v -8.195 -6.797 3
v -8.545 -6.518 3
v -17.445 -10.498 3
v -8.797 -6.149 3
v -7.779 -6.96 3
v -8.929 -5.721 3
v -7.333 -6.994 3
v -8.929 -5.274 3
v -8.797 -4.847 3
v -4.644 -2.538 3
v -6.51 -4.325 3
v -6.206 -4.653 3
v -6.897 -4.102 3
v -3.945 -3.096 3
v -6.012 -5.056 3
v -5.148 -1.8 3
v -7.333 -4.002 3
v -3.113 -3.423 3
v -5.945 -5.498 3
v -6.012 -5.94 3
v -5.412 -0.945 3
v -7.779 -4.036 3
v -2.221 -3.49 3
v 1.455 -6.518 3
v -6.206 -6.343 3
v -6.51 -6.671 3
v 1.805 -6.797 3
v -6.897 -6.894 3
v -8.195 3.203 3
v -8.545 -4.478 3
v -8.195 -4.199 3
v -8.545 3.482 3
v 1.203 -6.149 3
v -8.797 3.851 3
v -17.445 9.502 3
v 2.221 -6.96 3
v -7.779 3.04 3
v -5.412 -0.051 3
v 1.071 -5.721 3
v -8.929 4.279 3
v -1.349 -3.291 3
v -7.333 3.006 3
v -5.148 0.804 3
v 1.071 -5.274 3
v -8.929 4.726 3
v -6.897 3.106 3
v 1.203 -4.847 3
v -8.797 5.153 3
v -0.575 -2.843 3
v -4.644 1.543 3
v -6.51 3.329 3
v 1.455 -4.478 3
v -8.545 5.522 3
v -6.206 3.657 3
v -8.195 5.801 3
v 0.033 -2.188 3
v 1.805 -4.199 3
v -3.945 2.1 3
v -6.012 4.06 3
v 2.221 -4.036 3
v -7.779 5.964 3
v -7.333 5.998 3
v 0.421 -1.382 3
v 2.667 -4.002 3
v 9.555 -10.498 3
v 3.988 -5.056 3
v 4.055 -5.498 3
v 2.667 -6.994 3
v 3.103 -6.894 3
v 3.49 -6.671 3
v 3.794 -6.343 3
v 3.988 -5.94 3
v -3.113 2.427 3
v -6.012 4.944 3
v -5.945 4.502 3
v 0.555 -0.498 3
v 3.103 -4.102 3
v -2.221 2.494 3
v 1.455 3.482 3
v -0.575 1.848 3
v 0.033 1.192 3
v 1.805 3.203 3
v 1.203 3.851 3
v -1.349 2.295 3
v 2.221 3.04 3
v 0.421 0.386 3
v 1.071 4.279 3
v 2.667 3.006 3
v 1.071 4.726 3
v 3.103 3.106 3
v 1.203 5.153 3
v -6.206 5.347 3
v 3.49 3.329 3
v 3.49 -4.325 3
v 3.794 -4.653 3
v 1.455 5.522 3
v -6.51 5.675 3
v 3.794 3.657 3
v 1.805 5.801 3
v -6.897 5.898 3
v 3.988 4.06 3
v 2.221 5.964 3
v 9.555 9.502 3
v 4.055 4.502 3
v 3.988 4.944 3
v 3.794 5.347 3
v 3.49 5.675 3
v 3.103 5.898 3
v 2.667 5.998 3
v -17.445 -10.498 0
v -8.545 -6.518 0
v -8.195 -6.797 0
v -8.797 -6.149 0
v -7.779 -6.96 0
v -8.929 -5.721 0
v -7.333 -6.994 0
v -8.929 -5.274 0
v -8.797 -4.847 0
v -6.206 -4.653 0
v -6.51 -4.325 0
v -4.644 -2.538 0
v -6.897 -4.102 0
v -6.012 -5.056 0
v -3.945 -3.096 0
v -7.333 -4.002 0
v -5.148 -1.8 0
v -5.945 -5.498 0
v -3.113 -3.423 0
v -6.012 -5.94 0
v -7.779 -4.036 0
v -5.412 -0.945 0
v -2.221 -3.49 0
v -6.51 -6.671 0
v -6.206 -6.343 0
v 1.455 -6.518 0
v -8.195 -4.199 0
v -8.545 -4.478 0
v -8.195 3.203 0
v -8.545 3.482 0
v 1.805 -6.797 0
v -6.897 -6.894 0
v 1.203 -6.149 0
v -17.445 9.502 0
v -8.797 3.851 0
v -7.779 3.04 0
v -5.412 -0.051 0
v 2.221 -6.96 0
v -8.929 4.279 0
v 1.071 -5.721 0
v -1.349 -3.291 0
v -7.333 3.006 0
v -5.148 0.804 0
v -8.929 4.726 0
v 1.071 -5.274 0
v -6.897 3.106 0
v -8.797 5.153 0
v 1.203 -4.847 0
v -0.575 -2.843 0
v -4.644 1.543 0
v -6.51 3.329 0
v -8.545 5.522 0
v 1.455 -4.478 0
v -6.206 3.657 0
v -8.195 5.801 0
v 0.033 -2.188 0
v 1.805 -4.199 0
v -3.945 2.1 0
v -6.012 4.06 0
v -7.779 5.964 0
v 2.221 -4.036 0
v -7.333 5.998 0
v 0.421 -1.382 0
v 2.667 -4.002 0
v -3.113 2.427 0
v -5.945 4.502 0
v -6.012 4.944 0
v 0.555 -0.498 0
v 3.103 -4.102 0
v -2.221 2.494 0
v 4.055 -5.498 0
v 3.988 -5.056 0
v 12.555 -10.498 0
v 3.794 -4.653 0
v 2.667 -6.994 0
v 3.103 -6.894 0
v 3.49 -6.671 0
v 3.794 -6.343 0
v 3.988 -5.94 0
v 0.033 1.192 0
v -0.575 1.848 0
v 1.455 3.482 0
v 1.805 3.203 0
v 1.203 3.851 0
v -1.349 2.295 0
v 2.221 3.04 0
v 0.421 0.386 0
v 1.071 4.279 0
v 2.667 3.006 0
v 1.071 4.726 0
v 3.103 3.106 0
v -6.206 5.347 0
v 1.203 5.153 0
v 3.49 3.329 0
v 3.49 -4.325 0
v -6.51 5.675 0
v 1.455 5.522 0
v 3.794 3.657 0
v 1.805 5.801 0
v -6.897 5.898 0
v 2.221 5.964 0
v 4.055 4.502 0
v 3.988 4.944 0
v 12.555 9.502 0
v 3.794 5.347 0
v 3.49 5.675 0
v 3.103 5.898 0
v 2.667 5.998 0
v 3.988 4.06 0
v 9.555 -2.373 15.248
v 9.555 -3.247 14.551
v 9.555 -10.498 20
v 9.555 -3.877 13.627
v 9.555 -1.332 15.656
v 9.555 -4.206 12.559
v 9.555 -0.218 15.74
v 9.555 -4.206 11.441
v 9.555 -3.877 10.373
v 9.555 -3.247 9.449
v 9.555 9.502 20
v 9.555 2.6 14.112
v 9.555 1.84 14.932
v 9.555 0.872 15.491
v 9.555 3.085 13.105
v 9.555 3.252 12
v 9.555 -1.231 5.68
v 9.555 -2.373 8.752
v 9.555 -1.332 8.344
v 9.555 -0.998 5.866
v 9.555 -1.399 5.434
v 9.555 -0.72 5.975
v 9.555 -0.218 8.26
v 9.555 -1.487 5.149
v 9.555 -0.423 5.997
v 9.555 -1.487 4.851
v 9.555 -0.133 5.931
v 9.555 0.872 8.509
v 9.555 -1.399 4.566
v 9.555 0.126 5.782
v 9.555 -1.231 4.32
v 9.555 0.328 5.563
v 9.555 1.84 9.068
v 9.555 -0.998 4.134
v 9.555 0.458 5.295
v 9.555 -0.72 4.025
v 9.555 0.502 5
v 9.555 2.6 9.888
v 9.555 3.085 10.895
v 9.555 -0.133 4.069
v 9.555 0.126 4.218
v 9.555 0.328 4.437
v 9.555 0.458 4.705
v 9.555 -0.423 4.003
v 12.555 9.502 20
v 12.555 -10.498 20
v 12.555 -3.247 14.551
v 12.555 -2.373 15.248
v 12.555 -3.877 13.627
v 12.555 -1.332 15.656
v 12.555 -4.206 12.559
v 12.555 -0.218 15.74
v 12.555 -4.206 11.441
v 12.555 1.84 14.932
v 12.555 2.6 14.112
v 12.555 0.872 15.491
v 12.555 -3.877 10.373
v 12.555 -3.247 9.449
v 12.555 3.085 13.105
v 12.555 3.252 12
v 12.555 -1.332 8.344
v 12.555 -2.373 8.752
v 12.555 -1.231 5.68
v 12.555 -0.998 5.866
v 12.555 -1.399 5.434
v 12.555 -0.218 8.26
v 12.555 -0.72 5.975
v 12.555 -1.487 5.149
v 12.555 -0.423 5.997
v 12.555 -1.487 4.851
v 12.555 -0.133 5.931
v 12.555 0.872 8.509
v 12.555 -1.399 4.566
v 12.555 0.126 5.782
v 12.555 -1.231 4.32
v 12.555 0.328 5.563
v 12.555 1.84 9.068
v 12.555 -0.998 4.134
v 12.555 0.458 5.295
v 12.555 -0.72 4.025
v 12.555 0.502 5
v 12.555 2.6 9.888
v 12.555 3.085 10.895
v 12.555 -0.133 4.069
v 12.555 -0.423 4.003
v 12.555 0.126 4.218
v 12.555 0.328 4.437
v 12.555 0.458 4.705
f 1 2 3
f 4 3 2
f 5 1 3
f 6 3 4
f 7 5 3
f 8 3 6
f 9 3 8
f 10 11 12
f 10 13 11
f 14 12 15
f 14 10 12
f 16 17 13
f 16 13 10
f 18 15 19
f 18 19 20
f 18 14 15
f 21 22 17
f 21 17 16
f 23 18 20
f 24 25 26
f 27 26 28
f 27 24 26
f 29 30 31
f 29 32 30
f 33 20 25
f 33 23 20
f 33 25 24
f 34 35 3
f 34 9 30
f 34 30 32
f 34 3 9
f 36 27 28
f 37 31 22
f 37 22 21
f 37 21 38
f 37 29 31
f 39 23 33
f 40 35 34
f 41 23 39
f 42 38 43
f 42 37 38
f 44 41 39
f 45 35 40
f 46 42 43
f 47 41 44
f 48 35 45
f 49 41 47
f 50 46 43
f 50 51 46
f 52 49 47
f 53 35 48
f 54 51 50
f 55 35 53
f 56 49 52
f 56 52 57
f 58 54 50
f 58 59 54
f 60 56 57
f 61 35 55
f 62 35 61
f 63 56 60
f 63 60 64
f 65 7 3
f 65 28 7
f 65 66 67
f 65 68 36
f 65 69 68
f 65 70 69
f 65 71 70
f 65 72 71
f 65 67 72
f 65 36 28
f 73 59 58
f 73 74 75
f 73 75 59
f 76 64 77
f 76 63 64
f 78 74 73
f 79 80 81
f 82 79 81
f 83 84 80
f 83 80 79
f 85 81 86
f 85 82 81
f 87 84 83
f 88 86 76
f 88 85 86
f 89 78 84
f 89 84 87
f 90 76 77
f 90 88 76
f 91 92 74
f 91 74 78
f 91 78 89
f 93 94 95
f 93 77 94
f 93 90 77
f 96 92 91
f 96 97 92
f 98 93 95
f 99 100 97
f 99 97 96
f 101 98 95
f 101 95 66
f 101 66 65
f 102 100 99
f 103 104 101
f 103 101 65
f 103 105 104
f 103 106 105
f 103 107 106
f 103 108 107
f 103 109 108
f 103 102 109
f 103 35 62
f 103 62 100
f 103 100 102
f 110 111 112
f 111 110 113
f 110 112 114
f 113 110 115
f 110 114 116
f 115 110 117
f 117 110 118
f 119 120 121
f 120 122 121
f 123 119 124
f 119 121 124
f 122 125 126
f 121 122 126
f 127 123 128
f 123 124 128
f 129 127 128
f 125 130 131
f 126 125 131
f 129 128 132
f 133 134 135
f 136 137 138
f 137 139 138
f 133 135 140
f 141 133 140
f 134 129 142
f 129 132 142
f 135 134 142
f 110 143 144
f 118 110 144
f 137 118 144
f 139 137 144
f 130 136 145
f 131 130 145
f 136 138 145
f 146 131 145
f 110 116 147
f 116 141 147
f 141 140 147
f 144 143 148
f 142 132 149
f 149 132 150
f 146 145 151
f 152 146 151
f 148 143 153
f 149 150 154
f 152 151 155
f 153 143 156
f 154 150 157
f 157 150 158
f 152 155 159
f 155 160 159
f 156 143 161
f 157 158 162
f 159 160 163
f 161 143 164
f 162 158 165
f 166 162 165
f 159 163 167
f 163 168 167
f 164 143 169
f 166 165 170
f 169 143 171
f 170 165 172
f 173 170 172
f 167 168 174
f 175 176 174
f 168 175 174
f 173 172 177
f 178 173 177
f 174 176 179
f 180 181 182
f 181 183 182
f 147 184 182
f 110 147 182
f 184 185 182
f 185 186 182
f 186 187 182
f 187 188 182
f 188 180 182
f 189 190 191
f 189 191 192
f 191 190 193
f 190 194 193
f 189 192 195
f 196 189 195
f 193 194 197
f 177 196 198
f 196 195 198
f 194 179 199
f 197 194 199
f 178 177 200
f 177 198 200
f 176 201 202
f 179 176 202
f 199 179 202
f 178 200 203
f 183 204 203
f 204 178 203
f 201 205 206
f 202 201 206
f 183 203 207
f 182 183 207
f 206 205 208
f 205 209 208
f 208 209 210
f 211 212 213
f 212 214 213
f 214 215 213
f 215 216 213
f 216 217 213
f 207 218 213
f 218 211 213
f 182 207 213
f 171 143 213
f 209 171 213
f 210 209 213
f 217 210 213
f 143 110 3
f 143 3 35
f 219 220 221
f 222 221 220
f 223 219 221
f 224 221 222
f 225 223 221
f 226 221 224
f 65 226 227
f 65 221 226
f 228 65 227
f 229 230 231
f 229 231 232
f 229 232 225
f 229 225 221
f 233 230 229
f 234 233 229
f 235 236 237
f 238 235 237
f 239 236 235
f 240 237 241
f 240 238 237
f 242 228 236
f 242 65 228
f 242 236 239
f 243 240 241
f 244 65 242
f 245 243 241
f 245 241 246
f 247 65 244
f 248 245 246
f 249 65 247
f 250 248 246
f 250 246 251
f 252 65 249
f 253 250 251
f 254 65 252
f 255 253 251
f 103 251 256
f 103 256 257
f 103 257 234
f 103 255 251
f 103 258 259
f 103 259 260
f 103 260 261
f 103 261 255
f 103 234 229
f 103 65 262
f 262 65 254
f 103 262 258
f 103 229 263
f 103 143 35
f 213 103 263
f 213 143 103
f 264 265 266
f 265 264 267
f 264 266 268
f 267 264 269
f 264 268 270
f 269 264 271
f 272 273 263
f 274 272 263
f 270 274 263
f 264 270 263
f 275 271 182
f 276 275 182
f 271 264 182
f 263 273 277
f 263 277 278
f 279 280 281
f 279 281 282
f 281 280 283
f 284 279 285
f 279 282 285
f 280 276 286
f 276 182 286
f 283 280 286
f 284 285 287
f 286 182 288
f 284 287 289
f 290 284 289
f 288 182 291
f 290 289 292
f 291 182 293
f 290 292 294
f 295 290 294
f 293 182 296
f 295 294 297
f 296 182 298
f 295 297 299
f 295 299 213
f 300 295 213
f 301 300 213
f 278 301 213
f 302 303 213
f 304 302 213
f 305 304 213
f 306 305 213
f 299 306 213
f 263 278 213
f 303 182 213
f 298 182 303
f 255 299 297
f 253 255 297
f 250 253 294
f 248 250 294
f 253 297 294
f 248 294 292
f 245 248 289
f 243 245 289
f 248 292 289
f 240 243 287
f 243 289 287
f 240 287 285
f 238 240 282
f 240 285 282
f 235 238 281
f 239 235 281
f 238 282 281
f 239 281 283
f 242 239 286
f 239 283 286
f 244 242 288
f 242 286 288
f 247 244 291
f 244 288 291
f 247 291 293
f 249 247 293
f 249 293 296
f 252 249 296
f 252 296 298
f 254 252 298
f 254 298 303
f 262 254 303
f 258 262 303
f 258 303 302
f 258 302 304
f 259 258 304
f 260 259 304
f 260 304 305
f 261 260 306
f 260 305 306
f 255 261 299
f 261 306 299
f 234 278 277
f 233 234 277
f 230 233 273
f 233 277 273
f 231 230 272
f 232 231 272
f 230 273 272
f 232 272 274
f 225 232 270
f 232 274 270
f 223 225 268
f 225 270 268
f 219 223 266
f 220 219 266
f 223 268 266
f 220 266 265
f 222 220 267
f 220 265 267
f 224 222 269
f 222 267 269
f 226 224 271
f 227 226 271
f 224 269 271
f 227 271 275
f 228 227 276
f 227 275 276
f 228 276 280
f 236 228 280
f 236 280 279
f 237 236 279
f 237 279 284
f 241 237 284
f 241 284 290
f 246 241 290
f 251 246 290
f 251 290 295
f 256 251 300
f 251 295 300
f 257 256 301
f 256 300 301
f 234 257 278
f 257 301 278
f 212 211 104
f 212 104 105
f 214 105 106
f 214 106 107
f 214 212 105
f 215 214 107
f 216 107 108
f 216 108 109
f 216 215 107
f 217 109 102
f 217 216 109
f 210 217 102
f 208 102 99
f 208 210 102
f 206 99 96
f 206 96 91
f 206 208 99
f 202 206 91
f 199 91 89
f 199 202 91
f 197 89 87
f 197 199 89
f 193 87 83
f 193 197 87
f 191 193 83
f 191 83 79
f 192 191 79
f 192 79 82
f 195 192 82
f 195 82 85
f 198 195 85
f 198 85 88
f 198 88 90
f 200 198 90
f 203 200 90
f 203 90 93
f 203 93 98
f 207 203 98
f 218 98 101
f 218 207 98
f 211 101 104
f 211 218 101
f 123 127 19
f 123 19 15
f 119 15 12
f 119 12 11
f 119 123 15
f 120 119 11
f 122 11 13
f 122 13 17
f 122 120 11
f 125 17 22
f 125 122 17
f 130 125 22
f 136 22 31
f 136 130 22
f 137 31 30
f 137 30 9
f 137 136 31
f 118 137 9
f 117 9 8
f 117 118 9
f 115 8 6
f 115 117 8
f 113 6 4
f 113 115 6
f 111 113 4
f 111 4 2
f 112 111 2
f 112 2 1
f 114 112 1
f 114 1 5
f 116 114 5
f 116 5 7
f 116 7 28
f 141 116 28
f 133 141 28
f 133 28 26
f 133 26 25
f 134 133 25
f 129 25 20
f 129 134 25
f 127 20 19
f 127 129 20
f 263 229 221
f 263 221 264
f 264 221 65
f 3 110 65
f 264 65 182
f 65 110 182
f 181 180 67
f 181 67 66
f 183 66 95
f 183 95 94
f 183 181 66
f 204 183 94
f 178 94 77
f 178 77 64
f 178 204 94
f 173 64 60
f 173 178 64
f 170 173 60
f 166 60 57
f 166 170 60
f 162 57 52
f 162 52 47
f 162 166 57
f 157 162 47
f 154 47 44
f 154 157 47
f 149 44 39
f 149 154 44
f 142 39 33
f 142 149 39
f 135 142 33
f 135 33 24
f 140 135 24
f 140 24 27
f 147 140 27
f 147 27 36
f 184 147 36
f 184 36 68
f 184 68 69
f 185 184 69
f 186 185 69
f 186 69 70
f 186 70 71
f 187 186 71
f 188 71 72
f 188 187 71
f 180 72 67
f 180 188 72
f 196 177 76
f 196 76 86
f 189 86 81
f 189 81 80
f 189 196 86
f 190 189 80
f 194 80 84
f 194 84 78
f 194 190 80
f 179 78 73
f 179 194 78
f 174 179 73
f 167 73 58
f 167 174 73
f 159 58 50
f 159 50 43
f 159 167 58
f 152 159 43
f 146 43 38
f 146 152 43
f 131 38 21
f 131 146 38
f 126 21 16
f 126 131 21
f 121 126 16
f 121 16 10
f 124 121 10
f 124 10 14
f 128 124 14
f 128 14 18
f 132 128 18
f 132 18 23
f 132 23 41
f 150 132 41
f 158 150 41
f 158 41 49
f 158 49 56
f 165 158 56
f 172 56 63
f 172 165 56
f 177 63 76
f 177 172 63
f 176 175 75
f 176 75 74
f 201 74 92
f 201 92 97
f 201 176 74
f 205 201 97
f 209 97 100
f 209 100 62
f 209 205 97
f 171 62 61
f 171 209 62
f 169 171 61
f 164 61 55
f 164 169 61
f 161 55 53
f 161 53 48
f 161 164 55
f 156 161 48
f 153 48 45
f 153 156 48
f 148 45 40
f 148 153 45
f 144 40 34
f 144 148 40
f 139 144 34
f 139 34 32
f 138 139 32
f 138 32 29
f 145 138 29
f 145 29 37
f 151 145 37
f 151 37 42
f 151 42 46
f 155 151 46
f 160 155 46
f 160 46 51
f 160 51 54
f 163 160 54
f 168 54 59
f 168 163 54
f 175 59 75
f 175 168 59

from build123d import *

# Parameters (mm, degrees)
F0_W     = 27
F0_H     = 20
F0_R     = 1.5
F0_R_2   = 3
F1_DEPTH = 3
F0_W_2   = 3
F2_DEPTH = 20
F3_R     = 3.75
F3_R_2   = 1
F4_DEPTH = 3


with BuildPart() as f1:
    # F0 (on Top) → F1 (new body)
    with BuildSketch(Plane.XY):
        with Locations((-3.945278, -0.49793)):
            Rectangle(F0_W, F0_H)
        with Locations((-7.445278, -5.49793)):
            Circle(F0_R, mode=Mode.SUBTRACT)
        with Locations((2.554722, -5.49793)):
            Circle(F0_R, mode=Mode.SUBTRACT)
        with Locations((-7.445278, 4.50207)):
            Circle(F0_R, mode=Mode.SUBTRACT)
        with Locations((-2.445278, -0.49793)):
            Circle(F0_R_2, mode=Mode.SUBTRACT)
        with Locations((2.554722, 4.50207)):
            Circle(F0_R, mode=Mode.SUBTRACT)
    extrude(amount=F1_DEPTH)

    # F0 (on Top) → F2 (join)
    with BuildSketch(Plane.XY):
        with Locations((11.054722, -0.49793)):
            Rectangle(F0_W_2, F0_H)
    extrude(amount=F2_DEPTH)

    # F3 (on face) → F4 (cut)
    with BuildSketch(Plane.YZ.offset(12.554722)):
        with Locations((-0.49793, 12)):
            Circle(F3_R)
        with Locations((-0.49793, 5)):
            Circle(F3_R_2)
        with Locations((-0.49793, -2.5)):
            Circle(F3_R_2)
    extrude(amount=-F4_DEPTH, mode=Mode.SUBTRACT)


solid = f1.part
